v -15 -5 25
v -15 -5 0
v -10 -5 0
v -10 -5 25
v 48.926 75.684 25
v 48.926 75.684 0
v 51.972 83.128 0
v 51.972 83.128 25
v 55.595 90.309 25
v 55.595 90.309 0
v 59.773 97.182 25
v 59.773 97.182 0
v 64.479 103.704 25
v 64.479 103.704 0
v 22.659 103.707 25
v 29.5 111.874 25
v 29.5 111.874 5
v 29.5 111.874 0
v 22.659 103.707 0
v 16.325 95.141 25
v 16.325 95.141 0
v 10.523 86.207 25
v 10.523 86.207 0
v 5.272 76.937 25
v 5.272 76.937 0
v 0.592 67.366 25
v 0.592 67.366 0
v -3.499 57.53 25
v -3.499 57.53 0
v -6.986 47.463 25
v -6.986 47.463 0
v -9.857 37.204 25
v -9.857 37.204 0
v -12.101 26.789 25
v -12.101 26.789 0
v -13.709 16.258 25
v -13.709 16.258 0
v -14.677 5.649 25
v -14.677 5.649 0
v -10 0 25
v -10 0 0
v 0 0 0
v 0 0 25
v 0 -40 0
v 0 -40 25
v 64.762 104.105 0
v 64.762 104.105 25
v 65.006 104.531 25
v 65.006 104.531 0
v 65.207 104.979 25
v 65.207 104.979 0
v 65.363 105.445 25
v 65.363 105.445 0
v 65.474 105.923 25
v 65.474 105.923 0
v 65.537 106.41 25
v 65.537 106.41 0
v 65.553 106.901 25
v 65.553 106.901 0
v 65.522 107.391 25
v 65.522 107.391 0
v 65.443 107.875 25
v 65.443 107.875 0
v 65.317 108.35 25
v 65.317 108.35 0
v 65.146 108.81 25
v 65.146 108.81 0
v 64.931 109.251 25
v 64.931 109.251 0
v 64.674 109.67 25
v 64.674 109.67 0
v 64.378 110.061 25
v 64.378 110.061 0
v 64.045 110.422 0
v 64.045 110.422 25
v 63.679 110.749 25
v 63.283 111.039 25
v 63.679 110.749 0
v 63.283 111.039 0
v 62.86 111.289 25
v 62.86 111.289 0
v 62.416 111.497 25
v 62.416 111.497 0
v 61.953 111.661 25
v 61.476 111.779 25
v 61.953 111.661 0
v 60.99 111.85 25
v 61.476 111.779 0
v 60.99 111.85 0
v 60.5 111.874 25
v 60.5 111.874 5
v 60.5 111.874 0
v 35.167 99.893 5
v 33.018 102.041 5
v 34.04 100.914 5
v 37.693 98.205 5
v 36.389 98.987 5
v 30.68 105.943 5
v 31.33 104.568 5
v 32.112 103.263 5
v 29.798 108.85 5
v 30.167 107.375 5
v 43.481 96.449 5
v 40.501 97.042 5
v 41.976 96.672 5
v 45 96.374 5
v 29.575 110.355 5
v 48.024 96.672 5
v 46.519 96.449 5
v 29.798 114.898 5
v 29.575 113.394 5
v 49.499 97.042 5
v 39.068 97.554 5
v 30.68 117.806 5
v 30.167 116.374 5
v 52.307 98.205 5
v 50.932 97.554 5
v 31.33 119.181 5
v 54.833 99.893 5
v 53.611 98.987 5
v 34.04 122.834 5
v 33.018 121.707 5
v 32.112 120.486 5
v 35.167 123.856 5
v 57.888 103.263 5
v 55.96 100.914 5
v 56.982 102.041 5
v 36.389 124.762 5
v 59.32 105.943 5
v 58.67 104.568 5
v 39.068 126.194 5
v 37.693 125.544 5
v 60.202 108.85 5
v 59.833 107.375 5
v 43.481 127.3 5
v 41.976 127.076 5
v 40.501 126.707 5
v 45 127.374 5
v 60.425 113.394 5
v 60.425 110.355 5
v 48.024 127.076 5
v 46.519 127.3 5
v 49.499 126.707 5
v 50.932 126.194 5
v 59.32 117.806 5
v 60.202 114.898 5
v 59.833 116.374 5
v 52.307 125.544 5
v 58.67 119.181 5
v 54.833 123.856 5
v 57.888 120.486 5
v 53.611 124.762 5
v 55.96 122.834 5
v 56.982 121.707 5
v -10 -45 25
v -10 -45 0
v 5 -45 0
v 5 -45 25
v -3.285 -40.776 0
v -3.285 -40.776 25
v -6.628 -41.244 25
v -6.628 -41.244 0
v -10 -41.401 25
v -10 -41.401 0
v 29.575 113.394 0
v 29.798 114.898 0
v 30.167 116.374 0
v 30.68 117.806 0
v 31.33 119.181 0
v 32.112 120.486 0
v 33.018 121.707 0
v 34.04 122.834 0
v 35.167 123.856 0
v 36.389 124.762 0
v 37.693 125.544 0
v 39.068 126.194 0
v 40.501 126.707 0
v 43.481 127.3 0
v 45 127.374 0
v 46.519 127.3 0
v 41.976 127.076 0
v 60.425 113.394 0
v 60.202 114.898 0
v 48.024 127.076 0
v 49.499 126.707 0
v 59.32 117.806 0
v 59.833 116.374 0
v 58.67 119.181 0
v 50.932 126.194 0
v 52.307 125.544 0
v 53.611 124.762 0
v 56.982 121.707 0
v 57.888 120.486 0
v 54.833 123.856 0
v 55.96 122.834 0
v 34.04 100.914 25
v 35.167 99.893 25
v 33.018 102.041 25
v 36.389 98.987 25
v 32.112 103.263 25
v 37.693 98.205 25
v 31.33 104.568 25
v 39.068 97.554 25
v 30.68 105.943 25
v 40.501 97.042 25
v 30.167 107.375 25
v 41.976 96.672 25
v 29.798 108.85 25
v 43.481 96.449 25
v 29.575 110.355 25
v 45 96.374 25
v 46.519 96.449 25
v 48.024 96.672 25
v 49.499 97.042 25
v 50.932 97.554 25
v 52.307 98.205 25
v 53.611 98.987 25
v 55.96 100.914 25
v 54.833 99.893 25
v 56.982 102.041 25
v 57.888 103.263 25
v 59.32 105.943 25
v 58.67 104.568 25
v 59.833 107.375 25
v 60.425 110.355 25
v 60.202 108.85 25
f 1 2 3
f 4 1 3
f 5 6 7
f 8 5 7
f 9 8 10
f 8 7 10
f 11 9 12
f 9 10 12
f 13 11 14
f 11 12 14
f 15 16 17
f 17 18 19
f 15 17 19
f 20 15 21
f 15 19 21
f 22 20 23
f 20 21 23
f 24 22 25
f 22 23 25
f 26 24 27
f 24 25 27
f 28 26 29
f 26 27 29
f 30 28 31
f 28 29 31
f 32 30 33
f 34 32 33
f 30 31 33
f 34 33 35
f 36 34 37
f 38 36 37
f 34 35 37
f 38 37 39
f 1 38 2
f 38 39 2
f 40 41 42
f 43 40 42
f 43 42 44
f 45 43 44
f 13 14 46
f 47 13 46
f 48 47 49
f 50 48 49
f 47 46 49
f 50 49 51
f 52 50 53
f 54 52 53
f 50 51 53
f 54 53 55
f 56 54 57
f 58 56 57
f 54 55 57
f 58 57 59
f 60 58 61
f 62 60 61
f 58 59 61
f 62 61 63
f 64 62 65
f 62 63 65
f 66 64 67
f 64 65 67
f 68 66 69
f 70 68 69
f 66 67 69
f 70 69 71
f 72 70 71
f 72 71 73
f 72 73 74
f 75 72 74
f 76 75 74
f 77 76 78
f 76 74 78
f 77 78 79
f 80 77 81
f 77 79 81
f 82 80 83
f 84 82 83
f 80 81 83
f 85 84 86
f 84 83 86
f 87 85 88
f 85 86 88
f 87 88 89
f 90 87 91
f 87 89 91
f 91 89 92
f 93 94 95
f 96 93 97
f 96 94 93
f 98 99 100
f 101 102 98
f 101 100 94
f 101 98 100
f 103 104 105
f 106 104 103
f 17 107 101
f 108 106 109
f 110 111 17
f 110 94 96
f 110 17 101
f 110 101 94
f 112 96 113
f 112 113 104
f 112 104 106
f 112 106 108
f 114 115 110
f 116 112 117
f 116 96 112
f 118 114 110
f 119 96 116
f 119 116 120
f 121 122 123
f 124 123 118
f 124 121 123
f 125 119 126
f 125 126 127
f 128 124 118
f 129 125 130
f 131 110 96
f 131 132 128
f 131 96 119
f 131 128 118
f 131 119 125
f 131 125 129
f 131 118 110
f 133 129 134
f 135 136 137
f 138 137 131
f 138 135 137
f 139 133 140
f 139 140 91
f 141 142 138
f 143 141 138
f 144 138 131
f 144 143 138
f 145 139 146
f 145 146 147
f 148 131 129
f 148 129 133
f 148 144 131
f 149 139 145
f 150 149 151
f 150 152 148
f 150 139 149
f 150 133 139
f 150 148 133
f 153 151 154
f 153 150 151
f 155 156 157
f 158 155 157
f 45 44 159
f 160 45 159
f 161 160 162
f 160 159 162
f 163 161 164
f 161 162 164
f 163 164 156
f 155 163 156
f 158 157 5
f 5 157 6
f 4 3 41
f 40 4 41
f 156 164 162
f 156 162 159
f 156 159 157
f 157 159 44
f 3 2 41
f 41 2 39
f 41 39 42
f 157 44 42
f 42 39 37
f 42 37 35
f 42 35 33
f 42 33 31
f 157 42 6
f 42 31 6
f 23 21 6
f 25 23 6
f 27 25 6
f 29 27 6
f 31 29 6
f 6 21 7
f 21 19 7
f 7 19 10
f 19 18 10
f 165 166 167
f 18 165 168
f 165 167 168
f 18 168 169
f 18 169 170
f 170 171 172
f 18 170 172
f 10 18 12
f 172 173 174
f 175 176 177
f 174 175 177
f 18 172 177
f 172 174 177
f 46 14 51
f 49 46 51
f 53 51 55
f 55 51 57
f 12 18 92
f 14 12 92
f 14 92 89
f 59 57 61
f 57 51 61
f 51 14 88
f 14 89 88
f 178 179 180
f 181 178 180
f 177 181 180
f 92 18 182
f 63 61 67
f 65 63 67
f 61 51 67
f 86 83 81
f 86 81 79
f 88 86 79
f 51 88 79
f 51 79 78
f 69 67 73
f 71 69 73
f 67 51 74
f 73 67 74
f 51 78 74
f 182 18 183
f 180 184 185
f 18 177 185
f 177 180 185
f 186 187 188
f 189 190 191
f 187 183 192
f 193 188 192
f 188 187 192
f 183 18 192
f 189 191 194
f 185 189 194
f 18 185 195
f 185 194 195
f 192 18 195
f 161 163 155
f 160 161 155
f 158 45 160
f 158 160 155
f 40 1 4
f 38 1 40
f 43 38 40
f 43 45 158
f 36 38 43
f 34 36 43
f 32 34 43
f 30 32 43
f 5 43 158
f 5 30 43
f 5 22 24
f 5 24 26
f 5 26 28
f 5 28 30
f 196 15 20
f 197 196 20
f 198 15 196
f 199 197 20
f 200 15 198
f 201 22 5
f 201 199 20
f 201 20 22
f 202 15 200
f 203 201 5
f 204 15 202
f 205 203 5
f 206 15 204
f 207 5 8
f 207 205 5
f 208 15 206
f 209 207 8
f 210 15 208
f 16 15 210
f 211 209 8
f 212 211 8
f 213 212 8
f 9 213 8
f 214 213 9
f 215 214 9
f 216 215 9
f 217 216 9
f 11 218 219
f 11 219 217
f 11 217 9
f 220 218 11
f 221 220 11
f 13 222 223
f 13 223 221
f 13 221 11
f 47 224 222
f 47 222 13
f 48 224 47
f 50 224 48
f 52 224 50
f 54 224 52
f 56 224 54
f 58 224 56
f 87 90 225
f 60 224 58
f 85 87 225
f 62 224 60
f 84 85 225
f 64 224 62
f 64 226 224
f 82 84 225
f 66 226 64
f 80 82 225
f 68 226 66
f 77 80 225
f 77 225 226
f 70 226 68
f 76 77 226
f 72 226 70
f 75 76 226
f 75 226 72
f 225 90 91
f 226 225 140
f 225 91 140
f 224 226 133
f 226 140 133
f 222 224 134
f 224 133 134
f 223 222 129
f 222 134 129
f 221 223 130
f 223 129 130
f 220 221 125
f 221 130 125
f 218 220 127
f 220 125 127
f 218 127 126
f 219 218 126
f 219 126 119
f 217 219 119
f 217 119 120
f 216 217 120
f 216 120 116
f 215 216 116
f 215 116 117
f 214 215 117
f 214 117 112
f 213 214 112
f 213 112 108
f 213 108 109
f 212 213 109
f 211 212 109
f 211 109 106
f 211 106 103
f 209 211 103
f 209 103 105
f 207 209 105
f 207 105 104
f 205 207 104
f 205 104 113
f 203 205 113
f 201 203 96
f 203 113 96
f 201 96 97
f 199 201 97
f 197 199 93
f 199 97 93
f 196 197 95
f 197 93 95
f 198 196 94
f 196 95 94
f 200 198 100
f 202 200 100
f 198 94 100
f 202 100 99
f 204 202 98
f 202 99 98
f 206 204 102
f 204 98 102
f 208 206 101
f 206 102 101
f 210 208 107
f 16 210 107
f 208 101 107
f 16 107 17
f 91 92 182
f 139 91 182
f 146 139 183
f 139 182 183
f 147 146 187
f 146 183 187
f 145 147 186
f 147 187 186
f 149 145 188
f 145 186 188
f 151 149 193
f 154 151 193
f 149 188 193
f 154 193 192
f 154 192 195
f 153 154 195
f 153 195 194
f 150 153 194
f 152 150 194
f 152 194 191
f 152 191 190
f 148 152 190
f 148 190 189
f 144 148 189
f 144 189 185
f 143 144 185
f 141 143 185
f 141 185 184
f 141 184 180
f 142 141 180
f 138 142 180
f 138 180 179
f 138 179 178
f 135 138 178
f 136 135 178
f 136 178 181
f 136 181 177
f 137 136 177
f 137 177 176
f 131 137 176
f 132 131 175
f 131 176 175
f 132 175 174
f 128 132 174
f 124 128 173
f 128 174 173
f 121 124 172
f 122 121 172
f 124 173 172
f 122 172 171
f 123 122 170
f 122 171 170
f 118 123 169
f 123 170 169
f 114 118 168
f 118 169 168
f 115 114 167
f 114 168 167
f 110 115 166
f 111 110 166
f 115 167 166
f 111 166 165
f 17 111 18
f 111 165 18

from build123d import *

# Parameters (mm, degrees)
F1_DEPTH = 25
F2_DEPTH = 5


with BuildPart() as f1:
    # F0 (on Top) → F1 (new body)
    with BuildSketch(Plane.XY):
        with BuildLine():
            Line((-10, 0), (0, 0))
            Line((0, 0), (0, -40))
            ThreePointArc((0, -40), (-4.9512, -41.048712), (-10, -41.400549))
            Line((-10, -41.400549), (-10, -45))
            Line((-10, -45), (5, -45))
            Line((5, -45), (48.925537, 75.68442))
            ThreePointArc((48.925537, 75.68442), (55.595415, 90.308655), (64.478844, 103.704185))
            ThreePointArc((64.478844, 103.704185), (65.043731, 109.03319), (60.5, 111.874299))
            ThreePointArc((60.5, 111.874299), (45, 96.374299), (29.5, 111.874299))
            ThreePointArc((29.5, 111.874299), (-3.498619, 57.529697), (-15, -5))
            Line((-15, -5), (-10, -5))
            Line((-10, -5), (-10, 0))
        make_face()
    extrude(amount=F1_DEPTH)

    # F0 (on Top) → F2 (join)
    with BuildSketch(Plane.XY):
        with BuildLine():
            Line((60.5, 111.874299), (29.5, 111.874299))
            ThreePointArc((29.5, 111.874299), (45, 96.374299), (60.5, 111.874299))
        make_face()
        with BuildLine():
            ThreePointArc((60.5, 111.874299), (45, 127.374299), (29.5, 111.874299))
            Line((29.5, 111.874299), (60.5, 111.874299))
        make_face()
    extrude(amount=F2_DEPTH)


solid = f1.part
